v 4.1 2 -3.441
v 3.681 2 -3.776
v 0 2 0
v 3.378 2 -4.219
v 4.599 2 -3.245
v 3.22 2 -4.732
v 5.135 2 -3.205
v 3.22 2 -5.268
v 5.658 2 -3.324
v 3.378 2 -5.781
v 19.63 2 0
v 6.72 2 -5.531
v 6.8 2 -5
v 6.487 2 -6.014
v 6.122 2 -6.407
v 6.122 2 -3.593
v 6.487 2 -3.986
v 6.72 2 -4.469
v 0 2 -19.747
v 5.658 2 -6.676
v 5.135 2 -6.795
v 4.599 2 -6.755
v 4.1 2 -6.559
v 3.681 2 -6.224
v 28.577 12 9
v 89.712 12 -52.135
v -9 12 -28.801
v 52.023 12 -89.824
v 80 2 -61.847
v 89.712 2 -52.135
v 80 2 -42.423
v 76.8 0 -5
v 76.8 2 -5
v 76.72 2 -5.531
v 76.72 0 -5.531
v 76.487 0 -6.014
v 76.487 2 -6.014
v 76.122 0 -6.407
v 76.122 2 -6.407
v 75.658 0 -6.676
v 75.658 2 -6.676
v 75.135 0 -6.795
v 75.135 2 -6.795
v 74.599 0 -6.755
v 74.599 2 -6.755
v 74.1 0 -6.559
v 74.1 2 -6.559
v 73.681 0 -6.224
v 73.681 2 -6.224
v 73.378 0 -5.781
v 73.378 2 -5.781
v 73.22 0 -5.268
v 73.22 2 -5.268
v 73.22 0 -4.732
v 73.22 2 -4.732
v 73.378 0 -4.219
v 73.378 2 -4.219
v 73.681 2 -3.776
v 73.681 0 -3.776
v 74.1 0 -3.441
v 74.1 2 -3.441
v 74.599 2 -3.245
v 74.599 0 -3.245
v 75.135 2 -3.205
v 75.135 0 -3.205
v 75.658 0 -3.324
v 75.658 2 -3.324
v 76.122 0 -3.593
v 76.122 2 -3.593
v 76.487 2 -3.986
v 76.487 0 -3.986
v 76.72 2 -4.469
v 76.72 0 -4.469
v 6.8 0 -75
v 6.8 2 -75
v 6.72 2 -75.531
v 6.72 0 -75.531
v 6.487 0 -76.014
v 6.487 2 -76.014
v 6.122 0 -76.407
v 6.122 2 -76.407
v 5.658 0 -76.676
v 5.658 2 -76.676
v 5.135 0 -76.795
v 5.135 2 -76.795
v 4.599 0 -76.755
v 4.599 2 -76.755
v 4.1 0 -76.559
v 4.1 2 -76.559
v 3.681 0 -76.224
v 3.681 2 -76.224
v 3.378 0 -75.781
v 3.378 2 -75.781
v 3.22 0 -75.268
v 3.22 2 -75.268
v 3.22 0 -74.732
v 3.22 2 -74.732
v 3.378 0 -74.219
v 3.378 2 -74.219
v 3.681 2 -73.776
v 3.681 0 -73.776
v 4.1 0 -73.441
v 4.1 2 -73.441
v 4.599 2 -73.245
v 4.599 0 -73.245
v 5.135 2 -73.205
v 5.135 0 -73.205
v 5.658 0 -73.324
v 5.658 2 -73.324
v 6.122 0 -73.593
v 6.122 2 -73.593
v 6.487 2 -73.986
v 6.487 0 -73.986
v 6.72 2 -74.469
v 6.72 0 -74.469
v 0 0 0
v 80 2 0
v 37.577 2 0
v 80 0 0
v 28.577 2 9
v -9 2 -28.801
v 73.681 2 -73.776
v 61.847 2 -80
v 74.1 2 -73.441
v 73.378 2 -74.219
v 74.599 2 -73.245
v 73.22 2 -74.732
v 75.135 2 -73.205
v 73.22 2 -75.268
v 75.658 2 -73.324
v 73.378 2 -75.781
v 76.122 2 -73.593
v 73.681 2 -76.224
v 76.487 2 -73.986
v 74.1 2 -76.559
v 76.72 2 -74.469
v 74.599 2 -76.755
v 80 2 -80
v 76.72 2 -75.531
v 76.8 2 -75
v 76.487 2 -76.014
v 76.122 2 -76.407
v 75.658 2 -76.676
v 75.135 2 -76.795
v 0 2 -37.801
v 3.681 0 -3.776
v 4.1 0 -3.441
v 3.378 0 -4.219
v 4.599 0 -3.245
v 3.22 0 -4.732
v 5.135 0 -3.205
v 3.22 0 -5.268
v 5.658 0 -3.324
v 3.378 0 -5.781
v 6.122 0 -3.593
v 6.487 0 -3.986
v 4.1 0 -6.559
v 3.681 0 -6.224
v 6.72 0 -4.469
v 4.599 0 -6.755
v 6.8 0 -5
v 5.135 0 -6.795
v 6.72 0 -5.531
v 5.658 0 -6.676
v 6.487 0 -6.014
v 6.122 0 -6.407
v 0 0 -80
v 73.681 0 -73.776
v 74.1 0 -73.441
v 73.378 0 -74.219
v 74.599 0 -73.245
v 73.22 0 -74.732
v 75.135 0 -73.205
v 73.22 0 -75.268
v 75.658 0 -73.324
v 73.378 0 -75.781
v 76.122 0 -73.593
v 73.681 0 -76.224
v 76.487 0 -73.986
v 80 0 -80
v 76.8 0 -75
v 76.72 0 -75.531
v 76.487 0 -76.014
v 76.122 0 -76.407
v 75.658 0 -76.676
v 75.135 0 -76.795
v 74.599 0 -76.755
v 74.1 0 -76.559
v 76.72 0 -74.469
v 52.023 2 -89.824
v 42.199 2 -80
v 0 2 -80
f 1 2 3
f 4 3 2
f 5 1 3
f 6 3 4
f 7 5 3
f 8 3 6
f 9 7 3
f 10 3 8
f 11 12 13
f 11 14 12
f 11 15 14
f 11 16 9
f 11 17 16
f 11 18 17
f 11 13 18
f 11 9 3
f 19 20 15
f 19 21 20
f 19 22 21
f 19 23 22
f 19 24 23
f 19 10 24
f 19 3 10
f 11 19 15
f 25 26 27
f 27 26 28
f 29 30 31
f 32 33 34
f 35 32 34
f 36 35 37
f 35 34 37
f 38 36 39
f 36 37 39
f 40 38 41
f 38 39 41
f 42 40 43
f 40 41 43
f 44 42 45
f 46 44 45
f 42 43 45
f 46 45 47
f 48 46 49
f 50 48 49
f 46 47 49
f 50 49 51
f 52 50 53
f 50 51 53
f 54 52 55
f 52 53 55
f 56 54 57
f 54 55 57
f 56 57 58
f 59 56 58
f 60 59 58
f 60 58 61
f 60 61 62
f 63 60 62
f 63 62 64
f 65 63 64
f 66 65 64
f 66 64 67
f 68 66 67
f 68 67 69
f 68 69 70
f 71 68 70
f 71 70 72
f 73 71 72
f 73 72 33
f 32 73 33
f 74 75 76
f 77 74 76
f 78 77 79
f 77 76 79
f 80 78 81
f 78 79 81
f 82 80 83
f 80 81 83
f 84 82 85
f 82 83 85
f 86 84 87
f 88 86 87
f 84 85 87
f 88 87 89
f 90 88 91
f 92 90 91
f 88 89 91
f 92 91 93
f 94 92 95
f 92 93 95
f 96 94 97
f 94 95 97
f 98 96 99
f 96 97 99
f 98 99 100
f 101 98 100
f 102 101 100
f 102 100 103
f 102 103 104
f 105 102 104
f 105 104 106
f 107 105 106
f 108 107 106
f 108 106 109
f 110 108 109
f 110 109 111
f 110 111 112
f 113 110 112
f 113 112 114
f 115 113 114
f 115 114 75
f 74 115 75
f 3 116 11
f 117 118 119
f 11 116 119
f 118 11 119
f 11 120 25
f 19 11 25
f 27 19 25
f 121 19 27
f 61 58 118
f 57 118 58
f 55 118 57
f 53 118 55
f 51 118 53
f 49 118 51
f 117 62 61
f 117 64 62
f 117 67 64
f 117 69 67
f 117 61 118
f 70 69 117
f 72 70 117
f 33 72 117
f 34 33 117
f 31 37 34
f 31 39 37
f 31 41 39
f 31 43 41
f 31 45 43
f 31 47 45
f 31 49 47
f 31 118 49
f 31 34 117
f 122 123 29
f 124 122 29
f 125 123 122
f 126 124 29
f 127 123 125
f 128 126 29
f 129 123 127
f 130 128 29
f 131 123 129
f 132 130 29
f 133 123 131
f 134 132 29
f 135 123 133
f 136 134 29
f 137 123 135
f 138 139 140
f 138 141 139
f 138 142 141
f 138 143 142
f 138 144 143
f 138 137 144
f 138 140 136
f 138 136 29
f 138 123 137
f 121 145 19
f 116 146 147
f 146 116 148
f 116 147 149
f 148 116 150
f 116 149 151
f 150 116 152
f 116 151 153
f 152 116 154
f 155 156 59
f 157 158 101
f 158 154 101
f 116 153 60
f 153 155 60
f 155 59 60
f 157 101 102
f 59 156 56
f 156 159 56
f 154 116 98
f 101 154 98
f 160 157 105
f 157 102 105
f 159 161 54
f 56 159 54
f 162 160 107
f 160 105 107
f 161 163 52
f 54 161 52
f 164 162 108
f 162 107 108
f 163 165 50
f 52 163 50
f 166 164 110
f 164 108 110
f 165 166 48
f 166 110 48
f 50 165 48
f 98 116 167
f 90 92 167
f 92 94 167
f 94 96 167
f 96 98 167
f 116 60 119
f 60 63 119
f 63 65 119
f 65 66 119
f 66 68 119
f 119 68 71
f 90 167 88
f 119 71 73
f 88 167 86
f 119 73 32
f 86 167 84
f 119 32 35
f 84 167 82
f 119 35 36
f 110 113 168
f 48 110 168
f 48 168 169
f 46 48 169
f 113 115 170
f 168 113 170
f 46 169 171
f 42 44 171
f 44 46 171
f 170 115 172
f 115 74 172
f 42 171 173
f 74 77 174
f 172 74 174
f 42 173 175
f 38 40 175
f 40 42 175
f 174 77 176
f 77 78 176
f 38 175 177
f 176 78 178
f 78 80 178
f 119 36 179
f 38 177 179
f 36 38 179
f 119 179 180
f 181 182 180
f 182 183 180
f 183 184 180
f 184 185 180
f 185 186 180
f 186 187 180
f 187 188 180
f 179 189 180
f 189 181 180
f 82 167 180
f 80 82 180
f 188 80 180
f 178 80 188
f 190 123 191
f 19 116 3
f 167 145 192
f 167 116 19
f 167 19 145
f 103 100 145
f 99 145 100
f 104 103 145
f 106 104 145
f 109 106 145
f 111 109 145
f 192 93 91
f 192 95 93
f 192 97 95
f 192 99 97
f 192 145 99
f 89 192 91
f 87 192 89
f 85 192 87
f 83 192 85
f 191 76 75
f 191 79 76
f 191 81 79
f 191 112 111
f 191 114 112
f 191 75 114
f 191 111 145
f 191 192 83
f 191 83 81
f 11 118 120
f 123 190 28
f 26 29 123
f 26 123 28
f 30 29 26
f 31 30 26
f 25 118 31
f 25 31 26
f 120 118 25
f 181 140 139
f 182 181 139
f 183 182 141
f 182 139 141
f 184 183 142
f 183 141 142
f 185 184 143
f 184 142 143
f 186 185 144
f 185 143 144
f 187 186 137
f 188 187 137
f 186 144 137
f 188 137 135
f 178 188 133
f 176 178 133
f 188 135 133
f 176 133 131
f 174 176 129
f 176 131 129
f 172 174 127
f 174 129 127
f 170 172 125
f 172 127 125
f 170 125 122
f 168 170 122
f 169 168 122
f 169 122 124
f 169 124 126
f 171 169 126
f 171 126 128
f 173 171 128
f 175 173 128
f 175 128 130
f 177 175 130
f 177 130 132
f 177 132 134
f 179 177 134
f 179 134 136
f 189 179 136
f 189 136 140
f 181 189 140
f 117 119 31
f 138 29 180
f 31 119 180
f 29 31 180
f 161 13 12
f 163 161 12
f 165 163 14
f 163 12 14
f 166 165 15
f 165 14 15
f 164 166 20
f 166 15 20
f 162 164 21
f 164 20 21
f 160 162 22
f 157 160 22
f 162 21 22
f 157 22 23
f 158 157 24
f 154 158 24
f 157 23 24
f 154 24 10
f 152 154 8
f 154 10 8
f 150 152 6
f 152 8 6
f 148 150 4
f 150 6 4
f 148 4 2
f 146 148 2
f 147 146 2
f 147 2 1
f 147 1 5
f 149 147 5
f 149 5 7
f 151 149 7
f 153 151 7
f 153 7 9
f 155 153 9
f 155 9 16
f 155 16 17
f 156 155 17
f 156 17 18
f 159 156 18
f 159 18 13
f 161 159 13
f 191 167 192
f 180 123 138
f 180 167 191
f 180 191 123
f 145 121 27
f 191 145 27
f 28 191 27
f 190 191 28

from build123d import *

# Parameters (mm, degrees)
SKETCH1_W              = 80
SKETCH1_H              = 80
PCB_DEPTH              = 2
SKETCH2_R              = 1.8
ATTACHMENT_HOLES_DEPTH = 3
LPATTERN1_COUNT        = 2
LPATTERN1_PITCH        = 70
LPATTERN1_COUNT_DIR2   = 2
LPATTERN1_PITCH_DIR2   = 70
IDUINO_DEPTH           = 10


with BuildPart() as part:
    # Sketch1 → PCB (new body)
    with BuildSketch(Plane(origin=(0, 0, 0), x_dir=(1, 0, 0), z_dir=(0, 1, 0))):
        with Locations((40, 40)):
            Rectangle(SKETCH1_W, SKETCH1_H)
    extrude(amount=PCB_DEPTH)

    # Sketch2 → Attachment Holes (cut, through all)
    with BuildSketch(Plane(origin=(0, 2, 0), x_dir=(1, 0, 0), z_dir=(0, 1, 0))):
        with Locations((5, 75)):
            Circle(SKETCH2_R)
    attachment_holes = extrude(amount=-ATTACHMENT_HOLES_DEPTH, mode=Mode.SUBTRACT)

    # LPattern1: Attachment Holes 2 × 2
    with Locations(*[(i * LPATTERN1_PITCH, 0, j * LPATTERN1_PITCH_DIR2) for i in range(LPATTERN1_COUNT) for j in range(LPATTERN1_COUNT_DIR2) if (i, j) != (0, 0)]):
        add(attachment_holes, mode=Mode.SUBTRACT)

    # Sketch3 → Iduino (add)
    with BuildSketch(Plane(origin=(0, 2, 0), x_dir=(1, 0, 0), z_dir=(0, 1, 0))):
        Polygon((-9, 28.800714626), (52.023315216, 89.824029842), (89.711939971, 52.135405088), (28.576534883, -9), align=None)
    extrude(amount=IDUINO_DEPTH)


solid = part.part
